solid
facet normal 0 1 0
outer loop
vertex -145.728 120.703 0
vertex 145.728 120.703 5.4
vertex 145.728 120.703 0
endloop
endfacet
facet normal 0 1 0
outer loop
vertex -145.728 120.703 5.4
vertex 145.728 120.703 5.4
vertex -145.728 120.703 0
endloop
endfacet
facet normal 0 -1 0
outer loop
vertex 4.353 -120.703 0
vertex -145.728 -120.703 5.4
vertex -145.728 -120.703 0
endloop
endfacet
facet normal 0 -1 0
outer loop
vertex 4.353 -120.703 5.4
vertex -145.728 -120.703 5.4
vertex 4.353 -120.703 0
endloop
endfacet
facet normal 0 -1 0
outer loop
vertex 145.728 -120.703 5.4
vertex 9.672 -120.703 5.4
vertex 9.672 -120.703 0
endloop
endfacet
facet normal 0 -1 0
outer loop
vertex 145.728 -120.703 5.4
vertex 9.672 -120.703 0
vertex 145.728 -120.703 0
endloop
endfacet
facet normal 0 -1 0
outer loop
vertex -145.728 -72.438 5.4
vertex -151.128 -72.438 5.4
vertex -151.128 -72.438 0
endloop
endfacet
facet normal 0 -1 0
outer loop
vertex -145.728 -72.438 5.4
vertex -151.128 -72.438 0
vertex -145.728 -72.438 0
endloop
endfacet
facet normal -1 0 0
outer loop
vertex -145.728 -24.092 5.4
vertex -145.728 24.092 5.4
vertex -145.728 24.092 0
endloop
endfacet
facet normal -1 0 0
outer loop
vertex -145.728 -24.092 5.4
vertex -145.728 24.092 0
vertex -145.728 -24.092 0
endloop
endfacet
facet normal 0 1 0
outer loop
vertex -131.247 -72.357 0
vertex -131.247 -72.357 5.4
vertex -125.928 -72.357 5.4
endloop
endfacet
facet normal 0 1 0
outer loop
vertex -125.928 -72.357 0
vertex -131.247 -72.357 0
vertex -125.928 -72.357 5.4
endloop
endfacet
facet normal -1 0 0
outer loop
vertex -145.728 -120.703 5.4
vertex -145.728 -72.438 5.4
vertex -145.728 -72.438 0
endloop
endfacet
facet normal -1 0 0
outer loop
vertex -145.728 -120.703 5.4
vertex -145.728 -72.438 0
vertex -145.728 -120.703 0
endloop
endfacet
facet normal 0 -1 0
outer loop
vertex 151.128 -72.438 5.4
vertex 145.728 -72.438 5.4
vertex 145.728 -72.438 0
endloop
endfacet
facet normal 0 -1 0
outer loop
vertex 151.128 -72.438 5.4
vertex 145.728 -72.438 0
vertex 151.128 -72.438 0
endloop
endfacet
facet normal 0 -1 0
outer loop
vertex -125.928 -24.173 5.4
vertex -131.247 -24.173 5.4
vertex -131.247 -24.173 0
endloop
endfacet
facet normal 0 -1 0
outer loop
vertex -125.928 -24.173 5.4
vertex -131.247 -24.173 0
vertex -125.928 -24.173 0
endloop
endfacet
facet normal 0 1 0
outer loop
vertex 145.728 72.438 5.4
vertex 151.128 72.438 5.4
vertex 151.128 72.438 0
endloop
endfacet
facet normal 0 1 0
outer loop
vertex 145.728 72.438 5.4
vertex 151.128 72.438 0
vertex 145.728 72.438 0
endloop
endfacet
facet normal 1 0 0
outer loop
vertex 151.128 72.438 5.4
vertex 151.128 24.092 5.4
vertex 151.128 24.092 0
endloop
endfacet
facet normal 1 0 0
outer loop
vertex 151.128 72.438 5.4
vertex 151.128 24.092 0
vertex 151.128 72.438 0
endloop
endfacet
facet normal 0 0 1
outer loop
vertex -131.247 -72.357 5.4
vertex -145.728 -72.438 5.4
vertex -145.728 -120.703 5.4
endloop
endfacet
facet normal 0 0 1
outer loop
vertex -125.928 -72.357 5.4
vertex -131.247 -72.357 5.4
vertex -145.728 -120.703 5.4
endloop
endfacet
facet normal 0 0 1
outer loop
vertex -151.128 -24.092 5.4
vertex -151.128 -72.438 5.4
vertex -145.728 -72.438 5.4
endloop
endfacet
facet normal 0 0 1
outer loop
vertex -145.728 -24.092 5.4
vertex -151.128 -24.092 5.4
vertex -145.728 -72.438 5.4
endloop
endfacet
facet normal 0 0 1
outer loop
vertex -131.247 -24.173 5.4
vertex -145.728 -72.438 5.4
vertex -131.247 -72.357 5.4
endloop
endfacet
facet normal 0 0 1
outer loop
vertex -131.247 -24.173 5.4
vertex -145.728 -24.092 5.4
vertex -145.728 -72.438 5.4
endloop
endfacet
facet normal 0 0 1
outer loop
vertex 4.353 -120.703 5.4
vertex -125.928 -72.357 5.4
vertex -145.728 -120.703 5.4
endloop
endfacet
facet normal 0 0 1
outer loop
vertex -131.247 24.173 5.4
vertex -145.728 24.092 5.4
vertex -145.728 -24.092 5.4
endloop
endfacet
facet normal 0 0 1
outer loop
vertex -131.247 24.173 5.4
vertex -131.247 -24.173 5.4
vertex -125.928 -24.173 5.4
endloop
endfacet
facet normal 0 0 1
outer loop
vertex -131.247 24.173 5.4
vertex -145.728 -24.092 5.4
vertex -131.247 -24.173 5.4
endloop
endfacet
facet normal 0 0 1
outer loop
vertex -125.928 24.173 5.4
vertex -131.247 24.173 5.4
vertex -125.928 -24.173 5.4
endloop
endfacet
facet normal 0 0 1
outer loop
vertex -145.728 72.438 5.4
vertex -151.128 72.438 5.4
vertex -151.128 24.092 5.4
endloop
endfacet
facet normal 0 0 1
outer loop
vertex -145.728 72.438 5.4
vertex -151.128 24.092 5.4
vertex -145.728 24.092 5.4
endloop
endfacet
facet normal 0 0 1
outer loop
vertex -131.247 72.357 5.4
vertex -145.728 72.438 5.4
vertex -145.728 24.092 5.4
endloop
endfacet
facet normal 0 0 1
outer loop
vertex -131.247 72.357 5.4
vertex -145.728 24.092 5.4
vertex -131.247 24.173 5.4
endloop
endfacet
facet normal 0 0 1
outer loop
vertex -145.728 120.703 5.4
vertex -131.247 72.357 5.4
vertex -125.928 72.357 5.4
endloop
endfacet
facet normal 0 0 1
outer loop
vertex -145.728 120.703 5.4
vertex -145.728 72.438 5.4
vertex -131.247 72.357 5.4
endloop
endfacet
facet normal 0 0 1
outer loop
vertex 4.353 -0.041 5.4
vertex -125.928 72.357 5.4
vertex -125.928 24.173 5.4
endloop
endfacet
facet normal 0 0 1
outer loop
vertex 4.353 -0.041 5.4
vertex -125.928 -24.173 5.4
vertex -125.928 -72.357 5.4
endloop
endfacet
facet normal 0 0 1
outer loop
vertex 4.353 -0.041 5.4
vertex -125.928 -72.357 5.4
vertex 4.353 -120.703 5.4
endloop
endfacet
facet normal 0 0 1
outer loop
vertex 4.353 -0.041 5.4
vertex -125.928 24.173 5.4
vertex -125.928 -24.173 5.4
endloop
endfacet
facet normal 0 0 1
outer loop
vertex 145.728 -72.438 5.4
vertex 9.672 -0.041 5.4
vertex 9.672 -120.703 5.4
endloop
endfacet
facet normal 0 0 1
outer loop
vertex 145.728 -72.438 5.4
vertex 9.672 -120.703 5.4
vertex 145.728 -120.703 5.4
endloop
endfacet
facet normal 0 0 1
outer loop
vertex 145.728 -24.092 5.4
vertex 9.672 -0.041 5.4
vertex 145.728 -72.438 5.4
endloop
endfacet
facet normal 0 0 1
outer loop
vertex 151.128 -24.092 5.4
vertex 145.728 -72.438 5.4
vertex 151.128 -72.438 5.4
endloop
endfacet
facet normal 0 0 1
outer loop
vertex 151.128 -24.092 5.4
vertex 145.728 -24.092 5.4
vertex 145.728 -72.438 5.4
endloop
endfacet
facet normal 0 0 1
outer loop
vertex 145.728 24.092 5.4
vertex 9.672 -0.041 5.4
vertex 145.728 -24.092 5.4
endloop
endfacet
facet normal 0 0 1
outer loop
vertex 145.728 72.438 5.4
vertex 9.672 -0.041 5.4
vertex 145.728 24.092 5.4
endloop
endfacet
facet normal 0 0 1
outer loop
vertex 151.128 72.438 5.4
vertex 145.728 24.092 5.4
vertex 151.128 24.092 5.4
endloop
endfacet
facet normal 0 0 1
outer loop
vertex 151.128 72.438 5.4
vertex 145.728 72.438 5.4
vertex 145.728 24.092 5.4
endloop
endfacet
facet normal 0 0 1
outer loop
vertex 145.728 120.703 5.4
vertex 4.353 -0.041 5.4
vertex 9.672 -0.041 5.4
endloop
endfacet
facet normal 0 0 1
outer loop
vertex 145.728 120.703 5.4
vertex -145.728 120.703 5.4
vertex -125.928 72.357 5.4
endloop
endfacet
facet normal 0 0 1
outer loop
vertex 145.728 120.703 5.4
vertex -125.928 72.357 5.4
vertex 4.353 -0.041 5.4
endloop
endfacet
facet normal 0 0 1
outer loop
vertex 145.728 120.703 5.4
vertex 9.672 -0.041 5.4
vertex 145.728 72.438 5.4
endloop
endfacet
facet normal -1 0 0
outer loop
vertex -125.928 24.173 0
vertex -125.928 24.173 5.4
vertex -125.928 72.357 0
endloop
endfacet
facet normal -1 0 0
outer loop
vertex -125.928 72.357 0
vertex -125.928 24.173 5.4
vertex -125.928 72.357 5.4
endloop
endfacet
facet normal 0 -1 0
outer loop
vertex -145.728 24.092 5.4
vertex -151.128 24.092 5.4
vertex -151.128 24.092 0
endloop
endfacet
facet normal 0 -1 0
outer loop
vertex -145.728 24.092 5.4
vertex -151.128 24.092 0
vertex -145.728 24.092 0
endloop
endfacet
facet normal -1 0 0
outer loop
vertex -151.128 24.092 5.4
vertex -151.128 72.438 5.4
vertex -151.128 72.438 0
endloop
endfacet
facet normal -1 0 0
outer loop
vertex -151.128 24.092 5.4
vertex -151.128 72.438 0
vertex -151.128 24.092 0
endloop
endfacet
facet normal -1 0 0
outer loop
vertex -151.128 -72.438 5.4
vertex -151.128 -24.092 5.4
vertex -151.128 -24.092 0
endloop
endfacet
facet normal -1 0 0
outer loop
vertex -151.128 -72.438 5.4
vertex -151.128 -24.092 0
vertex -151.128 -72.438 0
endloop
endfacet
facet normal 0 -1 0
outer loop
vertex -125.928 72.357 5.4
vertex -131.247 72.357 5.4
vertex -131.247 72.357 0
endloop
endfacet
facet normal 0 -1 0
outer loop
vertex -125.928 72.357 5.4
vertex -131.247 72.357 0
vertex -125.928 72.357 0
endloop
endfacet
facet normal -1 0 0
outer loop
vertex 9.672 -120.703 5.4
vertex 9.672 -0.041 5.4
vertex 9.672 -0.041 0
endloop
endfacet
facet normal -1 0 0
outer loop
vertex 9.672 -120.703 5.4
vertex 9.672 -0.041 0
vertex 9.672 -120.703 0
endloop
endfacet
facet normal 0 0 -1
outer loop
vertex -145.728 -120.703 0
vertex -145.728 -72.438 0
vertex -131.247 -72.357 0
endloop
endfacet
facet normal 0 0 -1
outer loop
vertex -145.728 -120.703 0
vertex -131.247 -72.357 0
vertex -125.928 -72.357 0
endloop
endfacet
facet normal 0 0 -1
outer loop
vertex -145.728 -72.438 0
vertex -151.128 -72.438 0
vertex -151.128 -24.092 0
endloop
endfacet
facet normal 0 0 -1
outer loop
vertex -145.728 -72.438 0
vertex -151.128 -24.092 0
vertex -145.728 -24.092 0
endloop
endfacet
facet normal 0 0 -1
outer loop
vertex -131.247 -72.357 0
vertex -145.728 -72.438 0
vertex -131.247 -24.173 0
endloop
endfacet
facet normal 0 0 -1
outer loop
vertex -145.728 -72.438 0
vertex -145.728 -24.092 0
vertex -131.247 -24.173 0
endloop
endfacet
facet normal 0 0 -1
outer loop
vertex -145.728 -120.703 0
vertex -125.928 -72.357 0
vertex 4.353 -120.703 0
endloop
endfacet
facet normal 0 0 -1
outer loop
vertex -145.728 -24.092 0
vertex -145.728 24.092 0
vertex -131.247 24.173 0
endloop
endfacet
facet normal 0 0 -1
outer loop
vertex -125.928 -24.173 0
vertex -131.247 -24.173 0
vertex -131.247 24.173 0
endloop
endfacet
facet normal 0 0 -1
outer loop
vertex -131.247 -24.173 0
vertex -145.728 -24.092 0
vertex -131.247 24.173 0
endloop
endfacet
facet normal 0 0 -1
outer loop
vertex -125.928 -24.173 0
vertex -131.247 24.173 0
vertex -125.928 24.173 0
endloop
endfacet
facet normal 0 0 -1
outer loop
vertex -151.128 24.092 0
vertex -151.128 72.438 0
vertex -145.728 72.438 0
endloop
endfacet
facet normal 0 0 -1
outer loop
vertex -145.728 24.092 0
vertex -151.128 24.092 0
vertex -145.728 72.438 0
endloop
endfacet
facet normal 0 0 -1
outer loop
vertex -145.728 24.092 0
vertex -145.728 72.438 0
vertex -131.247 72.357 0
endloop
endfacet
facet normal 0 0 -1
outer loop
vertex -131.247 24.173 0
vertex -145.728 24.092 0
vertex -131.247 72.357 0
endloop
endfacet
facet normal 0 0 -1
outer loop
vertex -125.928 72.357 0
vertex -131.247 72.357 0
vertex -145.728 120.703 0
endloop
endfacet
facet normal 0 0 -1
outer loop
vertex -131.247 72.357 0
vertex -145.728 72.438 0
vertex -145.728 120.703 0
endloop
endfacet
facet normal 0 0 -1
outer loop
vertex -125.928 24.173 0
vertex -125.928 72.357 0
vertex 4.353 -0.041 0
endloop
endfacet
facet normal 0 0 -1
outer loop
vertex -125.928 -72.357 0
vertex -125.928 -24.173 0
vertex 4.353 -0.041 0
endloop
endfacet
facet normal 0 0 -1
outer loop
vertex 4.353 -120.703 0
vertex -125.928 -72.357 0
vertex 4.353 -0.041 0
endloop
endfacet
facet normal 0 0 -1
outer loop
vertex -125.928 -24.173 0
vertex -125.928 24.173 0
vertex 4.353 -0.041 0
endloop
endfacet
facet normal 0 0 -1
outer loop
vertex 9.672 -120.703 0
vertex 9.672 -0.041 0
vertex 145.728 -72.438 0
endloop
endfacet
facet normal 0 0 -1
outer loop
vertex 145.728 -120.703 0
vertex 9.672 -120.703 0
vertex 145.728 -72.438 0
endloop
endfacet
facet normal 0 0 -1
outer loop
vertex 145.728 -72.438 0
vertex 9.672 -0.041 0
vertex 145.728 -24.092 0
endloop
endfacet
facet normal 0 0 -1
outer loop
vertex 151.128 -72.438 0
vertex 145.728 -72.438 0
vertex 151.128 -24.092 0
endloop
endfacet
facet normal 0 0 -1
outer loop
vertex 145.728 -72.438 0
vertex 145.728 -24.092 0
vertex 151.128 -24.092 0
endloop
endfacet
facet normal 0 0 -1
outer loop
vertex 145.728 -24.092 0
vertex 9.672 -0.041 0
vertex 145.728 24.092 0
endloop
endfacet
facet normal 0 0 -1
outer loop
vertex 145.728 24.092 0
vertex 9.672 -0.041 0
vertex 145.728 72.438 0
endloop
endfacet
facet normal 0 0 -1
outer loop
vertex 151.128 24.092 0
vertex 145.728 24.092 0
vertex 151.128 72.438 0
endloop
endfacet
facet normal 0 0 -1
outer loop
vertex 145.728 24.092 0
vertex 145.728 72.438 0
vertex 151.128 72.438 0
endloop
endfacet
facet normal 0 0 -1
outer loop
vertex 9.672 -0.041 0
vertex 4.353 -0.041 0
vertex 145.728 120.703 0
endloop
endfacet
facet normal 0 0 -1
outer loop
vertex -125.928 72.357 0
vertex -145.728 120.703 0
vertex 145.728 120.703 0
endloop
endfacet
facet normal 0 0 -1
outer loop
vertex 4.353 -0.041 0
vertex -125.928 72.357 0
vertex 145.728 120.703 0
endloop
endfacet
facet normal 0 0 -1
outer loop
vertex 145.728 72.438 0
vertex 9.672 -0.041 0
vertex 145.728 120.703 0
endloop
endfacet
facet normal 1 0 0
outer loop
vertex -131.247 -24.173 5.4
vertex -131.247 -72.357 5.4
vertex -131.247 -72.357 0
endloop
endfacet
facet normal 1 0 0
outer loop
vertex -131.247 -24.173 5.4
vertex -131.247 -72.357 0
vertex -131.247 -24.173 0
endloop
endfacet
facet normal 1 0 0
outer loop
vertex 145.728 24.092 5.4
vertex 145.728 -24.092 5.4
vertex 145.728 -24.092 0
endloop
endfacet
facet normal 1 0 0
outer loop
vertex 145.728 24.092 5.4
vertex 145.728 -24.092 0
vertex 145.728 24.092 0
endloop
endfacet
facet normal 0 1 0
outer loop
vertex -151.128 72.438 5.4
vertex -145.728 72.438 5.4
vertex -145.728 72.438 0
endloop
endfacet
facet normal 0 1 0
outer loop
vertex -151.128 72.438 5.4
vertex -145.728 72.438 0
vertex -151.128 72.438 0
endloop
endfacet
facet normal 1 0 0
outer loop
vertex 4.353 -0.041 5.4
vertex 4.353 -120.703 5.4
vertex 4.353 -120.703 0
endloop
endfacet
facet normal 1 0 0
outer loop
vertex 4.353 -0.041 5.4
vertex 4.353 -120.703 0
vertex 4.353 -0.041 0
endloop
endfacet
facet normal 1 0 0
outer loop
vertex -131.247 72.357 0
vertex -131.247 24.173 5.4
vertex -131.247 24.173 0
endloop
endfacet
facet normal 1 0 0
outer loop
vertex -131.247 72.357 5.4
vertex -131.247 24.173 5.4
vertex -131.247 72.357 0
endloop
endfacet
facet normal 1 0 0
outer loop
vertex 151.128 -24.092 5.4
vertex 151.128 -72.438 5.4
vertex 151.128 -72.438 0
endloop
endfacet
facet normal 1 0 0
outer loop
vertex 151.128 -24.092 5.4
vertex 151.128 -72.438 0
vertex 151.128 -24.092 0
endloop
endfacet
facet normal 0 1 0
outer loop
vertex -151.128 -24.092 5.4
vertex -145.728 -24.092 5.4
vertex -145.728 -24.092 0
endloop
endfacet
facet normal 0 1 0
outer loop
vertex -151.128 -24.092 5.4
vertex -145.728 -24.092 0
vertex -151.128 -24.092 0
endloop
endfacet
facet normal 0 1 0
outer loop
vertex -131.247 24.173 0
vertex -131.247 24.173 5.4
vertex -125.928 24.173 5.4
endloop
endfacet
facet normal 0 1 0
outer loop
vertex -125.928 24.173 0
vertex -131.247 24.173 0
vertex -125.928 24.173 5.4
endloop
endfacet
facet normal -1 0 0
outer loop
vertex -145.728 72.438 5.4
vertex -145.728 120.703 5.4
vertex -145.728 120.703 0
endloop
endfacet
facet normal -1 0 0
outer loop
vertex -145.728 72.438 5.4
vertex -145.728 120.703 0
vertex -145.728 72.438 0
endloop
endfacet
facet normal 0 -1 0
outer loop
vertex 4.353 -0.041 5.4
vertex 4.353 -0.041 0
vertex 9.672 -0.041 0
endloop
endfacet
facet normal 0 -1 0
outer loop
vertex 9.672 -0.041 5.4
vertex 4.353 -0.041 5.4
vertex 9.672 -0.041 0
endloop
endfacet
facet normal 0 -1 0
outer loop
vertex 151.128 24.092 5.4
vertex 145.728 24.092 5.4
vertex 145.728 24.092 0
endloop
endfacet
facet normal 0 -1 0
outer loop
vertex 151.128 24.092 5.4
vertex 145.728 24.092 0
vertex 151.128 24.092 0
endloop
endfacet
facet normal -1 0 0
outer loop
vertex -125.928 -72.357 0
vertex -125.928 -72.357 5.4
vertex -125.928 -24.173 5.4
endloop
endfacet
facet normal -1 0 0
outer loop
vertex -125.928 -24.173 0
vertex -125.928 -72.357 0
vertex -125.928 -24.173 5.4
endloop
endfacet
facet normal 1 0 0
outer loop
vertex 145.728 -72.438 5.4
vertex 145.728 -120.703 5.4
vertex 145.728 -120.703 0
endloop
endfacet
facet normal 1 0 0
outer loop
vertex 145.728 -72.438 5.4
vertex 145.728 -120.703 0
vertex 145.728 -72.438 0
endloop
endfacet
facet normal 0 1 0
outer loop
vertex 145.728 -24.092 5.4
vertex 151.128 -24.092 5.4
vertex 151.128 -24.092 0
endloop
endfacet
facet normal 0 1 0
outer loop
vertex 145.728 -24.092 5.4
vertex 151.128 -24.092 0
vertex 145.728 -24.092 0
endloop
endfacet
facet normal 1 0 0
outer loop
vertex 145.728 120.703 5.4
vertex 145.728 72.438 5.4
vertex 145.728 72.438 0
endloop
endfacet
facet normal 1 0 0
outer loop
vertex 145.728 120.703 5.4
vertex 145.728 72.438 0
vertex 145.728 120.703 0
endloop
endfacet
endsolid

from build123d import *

# Parameters (mm, degrees)
SKETCH1_W           = 5.4
SKETCH1_H           = 48.265
BOSS_EXTRUDE1_DEPTH = 5.4
SKETCH2_W           = 5.31872
SKETCH2_H           = 48.18372
BOSS_EXTRUDE2_DEPTH = 5.4


with BuildPart() as part:
    # Sketch1 → Boss-Extrude1 (new body)
    with BuildSketch(Plane.XY):
        Polygon((9.7125, -120.6625), (145.6875, -120.6625), (145.6875, -72.3975), (151.0875, -72.3975), (151.0875, -24.1325), (145.6875, -24.1325), (145.6875, 24.1325), (151.0875, 24.1325), (151.0875, 72.3975), (145.6875, 72.3975), (145.6875, 120.6625), (-145.6875, 120.6625), (-145.6875, 72.3975), (-151.0875, 72.3975), (-151.0875, 24.1325), (-145.6875, 24.1325), (-145.6875, -24.1325), (-151.0875, -24.1325), (-151.0875, -72.3975), (-145.6875, -72.3975), (-145.6875, -120.6625), (4.3125, -120.6625), (4.3125, 0), (9.7125, 0), align=None)
        with Locations((-128.5875, -48.265)):
            Rectangle(SKETCH1_W, SKETCH1_H, mode=Mode.SUBTRACT)
        with Locations((-128.5875, 48.265)):
            Rectangle(SKETCH1_W, SKETCH1_H, mode=Mode.SUBTRACT)
    extrude(amount=BOSS_EXTRUDE1_DEPTH)

    # Sketch2 → Boss-Extrude2 (add)
    with BuildSketch(Plane.XY.offset(5.4)):
        Polygon((-145.72814, -120.70314), (4.35314, -120.70314), (4.35314, -0.04064), (9.67186, -0.04064), (9.67186, -120.70314), (145.72814, -120.70314), (145.72814, -72.43814), (151.12814, -72.43814), (151.12814, -24.09186), (145.72814, -24.09186), (145.72814, 24.09186), (151.12814, 24.09186), (151.12814, 72.43814), (145.72814, 72.43814), (145.72814, 120.70314), (-145.72814, 120.70314), (-145.72814, 72.43814), (-151.12814, 72.43814), (-151.12814, 24.09186), (-145.72814, 24.09186), (-145.72814, -24.09186), (-151.12814, -24.09186), (-151.12814, -72.43814), (-145.72814, -72.43814), align=None)
        with Locations((-128.5875, 48.265)):
            Rectangle(SKETCH2_W, SKETCH2_H, mode=Mode.SUBTRACT)
        with Locations((-128.5875, -48.265)):
            Rectangle(SKETCH2_W, SKETCH2_H, mode=Mode.SUBTRACT)
    extrude(amount=-BOSS_EXTRUDE2_DEPTH)


solid = part.part
